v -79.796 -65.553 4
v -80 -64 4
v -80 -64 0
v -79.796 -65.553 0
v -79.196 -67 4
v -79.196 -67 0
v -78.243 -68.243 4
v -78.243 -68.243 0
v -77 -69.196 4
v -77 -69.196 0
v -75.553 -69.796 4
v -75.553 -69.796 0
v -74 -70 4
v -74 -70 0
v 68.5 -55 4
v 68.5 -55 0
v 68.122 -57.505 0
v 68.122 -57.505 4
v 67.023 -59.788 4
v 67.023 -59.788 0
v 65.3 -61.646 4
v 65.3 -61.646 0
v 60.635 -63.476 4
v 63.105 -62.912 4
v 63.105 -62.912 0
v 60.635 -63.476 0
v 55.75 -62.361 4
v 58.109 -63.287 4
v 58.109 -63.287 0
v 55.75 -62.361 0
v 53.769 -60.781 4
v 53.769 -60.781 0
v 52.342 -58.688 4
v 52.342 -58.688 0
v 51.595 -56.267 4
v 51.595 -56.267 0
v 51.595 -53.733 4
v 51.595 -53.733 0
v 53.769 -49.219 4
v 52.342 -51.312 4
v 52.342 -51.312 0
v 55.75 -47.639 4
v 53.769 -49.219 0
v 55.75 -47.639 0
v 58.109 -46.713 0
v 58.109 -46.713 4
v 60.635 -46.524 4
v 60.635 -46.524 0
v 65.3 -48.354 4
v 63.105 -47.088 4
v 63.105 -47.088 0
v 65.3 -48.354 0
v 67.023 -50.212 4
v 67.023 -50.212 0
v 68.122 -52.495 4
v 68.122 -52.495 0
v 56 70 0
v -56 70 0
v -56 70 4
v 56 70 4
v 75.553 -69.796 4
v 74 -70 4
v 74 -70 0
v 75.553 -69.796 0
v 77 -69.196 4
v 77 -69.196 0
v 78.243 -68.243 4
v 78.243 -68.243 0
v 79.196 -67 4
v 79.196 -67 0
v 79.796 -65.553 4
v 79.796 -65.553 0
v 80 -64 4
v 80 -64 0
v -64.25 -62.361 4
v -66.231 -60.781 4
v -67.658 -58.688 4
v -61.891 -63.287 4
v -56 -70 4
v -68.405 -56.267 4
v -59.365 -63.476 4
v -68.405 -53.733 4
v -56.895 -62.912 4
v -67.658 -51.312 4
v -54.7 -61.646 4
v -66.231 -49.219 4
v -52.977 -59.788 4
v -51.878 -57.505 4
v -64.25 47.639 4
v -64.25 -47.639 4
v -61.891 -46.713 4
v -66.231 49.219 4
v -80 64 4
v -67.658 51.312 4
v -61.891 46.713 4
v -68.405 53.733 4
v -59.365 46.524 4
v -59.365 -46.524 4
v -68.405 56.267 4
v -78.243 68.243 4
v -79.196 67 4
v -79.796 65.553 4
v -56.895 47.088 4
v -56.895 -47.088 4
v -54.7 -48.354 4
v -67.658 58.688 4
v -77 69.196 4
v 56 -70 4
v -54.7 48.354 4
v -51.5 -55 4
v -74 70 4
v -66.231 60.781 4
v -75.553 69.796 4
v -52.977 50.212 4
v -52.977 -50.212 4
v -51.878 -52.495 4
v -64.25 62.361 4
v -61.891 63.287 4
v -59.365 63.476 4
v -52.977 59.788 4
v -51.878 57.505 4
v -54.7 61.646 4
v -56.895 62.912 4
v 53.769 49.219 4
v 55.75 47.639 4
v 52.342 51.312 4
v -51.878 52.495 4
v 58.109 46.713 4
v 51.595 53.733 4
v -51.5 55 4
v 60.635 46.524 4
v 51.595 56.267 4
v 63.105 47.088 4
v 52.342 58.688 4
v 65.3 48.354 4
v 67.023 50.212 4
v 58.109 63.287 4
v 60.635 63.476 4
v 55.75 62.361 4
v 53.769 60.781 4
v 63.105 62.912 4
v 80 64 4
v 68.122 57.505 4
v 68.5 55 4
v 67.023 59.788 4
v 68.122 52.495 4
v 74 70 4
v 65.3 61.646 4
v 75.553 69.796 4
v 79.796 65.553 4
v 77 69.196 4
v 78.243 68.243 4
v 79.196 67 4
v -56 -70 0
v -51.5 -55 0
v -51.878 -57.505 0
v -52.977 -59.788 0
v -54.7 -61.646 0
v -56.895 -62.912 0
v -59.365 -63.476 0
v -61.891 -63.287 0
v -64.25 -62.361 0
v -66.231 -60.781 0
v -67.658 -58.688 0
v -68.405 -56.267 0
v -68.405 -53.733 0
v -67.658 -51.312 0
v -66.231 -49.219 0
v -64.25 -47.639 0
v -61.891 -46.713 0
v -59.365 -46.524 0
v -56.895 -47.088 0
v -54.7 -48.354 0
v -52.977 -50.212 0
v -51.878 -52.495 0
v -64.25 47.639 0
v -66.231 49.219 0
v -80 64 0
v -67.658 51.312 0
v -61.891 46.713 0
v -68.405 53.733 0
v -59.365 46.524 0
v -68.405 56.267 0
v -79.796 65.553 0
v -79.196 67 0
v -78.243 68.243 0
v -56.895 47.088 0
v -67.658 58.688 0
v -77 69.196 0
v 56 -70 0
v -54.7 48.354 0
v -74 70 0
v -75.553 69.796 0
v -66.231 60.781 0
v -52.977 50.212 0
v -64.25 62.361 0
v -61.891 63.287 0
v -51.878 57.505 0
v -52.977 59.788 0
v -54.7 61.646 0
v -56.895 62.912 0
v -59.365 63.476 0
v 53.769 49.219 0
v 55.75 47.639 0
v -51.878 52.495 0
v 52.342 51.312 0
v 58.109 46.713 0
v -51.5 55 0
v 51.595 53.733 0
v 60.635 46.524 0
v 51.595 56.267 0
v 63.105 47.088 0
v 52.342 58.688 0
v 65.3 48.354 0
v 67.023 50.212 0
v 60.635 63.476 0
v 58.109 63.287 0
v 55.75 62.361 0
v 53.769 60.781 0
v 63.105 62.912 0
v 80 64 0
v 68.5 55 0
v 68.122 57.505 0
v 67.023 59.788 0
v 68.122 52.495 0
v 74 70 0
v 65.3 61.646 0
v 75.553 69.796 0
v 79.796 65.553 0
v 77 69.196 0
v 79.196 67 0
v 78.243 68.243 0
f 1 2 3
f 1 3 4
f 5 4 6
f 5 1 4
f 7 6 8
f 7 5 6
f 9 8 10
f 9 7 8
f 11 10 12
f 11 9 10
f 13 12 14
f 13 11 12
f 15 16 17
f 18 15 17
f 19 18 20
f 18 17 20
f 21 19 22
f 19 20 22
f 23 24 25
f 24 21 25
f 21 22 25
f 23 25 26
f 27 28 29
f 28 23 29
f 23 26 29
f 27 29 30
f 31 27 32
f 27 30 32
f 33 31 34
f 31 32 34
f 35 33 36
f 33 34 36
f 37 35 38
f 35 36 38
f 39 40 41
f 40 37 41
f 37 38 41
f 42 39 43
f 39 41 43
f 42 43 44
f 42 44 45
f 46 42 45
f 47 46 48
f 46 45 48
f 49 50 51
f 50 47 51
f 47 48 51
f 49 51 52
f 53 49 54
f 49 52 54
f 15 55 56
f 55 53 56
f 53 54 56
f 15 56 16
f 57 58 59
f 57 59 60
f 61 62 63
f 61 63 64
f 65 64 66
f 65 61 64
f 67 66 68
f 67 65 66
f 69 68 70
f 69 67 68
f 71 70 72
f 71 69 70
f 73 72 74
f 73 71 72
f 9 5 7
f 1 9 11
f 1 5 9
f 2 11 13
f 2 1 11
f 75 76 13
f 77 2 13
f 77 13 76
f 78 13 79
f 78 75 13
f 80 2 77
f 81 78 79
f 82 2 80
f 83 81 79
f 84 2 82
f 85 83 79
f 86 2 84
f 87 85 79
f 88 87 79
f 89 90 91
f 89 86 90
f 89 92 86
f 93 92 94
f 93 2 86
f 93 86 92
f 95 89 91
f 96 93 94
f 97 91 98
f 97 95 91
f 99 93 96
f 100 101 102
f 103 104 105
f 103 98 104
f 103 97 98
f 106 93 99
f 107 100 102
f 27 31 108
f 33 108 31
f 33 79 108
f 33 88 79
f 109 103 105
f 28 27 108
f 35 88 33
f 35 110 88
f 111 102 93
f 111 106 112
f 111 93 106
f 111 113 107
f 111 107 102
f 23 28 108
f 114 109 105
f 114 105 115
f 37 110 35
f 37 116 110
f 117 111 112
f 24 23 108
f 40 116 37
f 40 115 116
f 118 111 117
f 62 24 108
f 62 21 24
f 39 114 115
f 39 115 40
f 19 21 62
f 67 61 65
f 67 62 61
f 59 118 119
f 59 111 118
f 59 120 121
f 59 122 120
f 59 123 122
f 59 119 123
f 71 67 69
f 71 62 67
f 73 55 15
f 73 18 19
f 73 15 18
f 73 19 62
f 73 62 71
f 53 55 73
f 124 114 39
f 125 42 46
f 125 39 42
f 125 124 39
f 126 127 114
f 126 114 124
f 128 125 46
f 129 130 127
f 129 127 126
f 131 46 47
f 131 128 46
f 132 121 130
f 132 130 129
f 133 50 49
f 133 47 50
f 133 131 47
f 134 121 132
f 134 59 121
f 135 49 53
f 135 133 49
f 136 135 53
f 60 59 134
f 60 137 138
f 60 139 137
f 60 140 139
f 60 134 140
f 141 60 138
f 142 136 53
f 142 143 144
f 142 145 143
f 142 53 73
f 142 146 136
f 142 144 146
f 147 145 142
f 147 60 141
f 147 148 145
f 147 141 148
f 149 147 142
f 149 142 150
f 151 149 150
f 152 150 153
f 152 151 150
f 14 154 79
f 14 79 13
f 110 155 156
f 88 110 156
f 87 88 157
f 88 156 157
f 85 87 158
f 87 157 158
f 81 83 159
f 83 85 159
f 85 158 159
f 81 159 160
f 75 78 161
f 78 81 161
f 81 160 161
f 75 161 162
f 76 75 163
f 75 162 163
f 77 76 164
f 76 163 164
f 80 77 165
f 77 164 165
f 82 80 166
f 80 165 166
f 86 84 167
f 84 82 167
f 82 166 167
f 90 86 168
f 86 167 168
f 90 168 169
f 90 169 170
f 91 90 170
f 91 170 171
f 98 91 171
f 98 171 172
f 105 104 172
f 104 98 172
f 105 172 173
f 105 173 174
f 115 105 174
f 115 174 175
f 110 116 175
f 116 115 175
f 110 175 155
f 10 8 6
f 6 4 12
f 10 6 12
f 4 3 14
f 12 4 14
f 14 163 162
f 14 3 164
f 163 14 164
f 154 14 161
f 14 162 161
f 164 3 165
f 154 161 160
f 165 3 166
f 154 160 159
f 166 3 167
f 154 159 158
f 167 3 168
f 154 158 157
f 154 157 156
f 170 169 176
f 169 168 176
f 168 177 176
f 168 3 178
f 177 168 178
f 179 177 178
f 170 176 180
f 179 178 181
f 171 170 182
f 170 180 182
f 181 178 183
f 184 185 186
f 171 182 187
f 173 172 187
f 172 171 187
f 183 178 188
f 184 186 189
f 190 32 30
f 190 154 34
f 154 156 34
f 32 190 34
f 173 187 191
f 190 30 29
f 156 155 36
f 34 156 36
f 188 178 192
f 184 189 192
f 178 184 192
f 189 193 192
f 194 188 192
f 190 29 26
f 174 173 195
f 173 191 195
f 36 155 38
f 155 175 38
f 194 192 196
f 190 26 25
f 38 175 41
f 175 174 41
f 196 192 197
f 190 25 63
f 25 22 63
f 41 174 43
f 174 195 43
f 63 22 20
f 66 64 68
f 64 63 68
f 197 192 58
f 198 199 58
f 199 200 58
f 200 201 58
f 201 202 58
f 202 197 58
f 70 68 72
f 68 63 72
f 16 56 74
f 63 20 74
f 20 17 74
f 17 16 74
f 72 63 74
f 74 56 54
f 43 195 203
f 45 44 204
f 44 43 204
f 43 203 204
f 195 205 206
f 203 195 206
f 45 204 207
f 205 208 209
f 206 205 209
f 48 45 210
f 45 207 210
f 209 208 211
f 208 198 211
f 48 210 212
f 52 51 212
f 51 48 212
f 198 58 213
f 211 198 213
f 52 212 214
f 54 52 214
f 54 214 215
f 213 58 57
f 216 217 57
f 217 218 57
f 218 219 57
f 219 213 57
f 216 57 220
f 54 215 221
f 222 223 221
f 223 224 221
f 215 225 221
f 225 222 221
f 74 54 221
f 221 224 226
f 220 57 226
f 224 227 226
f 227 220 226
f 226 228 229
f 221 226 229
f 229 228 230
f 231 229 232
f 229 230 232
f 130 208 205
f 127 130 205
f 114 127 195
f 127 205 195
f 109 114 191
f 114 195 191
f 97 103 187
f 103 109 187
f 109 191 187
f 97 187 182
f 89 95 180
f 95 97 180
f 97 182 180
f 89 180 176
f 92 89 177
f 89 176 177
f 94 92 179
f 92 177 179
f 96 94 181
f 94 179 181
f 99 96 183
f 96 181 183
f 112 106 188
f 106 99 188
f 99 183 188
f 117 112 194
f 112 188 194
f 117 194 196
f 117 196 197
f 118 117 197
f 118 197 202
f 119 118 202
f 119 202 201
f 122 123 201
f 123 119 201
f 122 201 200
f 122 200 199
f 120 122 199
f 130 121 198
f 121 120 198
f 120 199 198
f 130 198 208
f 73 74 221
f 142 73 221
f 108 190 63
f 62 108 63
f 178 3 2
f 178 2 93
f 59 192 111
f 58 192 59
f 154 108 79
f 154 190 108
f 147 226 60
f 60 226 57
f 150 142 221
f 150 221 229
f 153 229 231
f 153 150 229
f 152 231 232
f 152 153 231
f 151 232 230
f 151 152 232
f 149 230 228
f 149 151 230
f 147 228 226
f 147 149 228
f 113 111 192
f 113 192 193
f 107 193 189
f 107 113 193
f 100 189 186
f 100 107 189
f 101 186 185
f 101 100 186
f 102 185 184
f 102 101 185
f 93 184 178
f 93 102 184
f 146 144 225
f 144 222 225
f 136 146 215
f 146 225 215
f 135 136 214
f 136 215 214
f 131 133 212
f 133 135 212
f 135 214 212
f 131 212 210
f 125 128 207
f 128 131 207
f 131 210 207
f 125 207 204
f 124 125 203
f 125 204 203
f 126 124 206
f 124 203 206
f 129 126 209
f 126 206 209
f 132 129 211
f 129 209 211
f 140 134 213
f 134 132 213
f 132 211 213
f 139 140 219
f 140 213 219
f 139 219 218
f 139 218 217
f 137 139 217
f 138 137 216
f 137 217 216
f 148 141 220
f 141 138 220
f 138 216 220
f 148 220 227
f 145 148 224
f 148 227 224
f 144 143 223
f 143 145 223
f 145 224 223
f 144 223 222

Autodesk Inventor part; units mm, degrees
ref_plane "YZ Plane" through (0, 0, 0) normal (1, 0, 0) x (0, 1, 0)
ref_plane "XZ Plane" through (0, 0, 0) normal (0, 1, 0) x (-1, 0, 0)
ref_plane "XY Plane" through (0, 0, 0) normal (0, 0, 1) x (1, 0, 0)
sketch3d "3D Sketch1"
sketch "Sketch1" plane through (0, 0, 0) normal (0, 0, 1) x (1, 0, 0)
  line L0 (-56, 70) -> (56, 70)
  line L1 (56, 70) -> (56, -70) construction
  line L2 (56, -70) -> (-56, -70)
  line L3 (-56, -70) -> (-56, 70) construction
  line L4 (-56, 70) -> (56, -70) construction
  line L5 (56, 70) -> (-56, -70) construction
  line L6 (56, -70) -> (80, -70)
  line L7 (80, -70) -> (80, 70)
  line L8 (80, 70) -> (56, 70)
  line L9 (-56, -70) -> (-80, -70)
  line L10 (-80, -70) -> (-80, 70)
  line L11 (-80, 70) -> (-56, 70)
  circle A0 centre (60, -55) radius 8.5
  circle A1 centre (60, 55) radius 8.5
  circle A2 centre (-60, -55) radius 8.5
  circle A3 centre (-60, 55) radius 8.5
  line L12 (0, -70) -> (0, 70) construction
  line L13 (80, 0) -> (-80, 0) construction
  point P0 (0, 0)
  dimension "d30" = 140
  dimension "d34" = 160
  dimension "d35" = 17
  dimension "d36" = 20
  dimension "d37" = 15
extrude "Plate1" add sketch "Sketch1" along normal blind 4
fillet "Corner Round1" radius 6 4 edges at (80, 70, 2) (-80, 70, 2) (-80, -70, 2) (80, -70, 2)
equation "\"d6\" = Thickness"
equation "\"BendReliefWidth\" = Thickness"
equation "\"BendReliefDepth\" = 0.5 * Thickness"
equation "\"CornerReliefSize\" = 4 * Thickness"
equation "\"MinimumRemnant\" = 2 * Thickness"
equation "\"TransitionRadius\" = BendRadius"
equation "\"JacobiRadiusSize\" = BendRadius"
equation "\"GapSize\" = Thickness"
equation "\"Thickness\" = 4"
equation "\"BendRadius\" = 6"
properties part number "ASY MSC 909 base frame transverse" material "Steel"
